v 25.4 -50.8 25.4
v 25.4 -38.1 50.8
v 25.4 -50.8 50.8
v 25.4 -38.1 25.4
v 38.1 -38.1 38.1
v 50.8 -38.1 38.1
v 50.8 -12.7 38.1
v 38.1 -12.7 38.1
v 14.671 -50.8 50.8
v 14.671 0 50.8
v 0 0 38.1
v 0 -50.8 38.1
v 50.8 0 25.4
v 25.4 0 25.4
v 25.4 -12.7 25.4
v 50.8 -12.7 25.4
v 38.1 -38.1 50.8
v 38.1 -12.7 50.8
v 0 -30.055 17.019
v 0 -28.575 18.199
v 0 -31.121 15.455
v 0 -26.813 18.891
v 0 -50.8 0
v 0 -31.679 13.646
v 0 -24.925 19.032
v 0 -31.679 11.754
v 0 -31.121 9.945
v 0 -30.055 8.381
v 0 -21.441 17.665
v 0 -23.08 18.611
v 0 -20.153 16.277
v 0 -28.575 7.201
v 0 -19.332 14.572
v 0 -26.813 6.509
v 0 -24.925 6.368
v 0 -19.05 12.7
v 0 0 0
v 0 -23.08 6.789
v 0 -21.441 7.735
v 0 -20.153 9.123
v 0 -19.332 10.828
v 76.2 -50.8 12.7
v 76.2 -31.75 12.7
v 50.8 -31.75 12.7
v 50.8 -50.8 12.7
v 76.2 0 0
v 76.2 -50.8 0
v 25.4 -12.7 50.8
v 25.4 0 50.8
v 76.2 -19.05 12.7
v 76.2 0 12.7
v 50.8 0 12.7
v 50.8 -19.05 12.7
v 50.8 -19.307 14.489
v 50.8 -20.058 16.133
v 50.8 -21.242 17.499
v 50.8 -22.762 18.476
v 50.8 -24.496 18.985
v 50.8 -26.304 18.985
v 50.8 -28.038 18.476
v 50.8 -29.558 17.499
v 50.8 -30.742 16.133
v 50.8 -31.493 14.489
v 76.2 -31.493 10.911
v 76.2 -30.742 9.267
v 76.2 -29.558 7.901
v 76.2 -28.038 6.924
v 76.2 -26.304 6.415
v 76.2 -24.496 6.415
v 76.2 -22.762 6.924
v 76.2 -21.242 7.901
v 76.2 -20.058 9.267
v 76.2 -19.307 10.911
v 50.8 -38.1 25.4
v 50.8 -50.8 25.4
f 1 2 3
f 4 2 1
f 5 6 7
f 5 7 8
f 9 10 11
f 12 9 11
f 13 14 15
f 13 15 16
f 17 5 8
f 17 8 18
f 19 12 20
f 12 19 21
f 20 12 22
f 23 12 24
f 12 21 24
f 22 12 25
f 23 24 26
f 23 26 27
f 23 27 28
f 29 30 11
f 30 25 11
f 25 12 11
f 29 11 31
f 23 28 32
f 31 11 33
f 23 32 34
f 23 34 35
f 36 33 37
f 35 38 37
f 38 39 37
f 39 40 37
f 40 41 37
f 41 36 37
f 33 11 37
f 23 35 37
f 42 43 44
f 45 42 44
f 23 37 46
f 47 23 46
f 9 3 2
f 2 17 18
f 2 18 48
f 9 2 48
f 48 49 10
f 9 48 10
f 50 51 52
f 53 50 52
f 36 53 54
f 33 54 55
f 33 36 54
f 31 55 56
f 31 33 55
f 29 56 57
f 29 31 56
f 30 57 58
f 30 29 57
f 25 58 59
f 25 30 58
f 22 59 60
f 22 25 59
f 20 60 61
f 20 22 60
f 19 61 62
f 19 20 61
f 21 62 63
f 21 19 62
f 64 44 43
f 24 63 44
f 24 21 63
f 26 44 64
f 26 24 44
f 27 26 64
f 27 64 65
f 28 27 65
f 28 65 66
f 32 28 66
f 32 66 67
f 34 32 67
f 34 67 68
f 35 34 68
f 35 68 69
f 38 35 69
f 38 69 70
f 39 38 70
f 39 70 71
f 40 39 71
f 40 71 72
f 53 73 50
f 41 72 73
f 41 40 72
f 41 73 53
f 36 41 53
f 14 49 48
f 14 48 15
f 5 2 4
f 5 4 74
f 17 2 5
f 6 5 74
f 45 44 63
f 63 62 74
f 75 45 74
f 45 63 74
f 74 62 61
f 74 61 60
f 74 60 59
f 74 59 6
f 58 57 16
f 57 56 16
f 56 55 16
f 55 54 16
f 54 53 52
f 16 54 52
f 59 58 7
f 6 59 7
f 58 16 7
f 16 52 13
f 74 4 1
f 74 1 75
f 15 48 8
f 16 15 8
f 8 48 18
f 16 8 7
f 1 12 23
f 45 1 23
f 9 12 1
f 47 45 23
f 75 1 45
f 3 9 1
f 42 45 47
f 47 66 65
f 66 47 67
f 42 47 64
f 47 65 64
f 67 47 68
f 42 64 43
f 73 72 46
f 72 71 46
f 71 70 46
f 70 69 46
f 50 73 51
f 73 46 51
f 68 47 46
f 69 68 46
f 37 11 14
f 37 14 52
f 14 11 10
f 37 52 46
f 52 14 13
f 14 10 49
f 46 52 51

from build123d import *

# Parameters (mm, degrees)
F1_DEPTH = 50.8
F3_DEPTH = 12.7
F5_START = 38.1
F5_DEPTH = 12.701
F6_R     = 6.35
F7_DEPTH = 76.201


with BuildPart() as f1:
    # F0 (on Front) → F1 (new body)
    with BuildSketch(Plane.XZ):
        Polygon((0, 38.1), (0, 0), (76.2, 0), (76.2, 12.7), (50.8, 12.7), (50.8, 38.1), (38.1, 38.1), (38.1, 50.8), (14.6706935452, 50.8), align=None)
    extrude(amount=F1_DEPTH)

    # F2 (on Front) → F3 (cut)
    with BuildSketch(Plane.XZ):
        Polygon((38.1, 50.8), (25.4, 50.8), (25.4, 25.4), (50.8, 25.4), (50.8, 38.1), (38.1, 38.1), align=None)
    extrude(amount=F3_DEPTH, mode=Mode.SUBTRACT)

    # F4 (on Front) → F5 (cut)
    with BuildSketch(Plane.XZ.offset(F5_START)):
        Polygon((38.1, 50.8), (25.4, 50.8), (25.4, 25.4), (50.8, 25.4), (50.8, 38.1), (38.1, 38.1), align=None)
    extrude(amount=F5_DEPTH, mode=Mode.SUBTRACT)

    # F6 (on Right) → F7 (cut, through all)
    with BuildSketch(Plane.YZ):
        with Locations((-25.4, 12.7)):
            Circle(F6_R)
    extrude(amount=F7_DEPTH, mode=Mode.SUBTRACT)


solid = f1.part
